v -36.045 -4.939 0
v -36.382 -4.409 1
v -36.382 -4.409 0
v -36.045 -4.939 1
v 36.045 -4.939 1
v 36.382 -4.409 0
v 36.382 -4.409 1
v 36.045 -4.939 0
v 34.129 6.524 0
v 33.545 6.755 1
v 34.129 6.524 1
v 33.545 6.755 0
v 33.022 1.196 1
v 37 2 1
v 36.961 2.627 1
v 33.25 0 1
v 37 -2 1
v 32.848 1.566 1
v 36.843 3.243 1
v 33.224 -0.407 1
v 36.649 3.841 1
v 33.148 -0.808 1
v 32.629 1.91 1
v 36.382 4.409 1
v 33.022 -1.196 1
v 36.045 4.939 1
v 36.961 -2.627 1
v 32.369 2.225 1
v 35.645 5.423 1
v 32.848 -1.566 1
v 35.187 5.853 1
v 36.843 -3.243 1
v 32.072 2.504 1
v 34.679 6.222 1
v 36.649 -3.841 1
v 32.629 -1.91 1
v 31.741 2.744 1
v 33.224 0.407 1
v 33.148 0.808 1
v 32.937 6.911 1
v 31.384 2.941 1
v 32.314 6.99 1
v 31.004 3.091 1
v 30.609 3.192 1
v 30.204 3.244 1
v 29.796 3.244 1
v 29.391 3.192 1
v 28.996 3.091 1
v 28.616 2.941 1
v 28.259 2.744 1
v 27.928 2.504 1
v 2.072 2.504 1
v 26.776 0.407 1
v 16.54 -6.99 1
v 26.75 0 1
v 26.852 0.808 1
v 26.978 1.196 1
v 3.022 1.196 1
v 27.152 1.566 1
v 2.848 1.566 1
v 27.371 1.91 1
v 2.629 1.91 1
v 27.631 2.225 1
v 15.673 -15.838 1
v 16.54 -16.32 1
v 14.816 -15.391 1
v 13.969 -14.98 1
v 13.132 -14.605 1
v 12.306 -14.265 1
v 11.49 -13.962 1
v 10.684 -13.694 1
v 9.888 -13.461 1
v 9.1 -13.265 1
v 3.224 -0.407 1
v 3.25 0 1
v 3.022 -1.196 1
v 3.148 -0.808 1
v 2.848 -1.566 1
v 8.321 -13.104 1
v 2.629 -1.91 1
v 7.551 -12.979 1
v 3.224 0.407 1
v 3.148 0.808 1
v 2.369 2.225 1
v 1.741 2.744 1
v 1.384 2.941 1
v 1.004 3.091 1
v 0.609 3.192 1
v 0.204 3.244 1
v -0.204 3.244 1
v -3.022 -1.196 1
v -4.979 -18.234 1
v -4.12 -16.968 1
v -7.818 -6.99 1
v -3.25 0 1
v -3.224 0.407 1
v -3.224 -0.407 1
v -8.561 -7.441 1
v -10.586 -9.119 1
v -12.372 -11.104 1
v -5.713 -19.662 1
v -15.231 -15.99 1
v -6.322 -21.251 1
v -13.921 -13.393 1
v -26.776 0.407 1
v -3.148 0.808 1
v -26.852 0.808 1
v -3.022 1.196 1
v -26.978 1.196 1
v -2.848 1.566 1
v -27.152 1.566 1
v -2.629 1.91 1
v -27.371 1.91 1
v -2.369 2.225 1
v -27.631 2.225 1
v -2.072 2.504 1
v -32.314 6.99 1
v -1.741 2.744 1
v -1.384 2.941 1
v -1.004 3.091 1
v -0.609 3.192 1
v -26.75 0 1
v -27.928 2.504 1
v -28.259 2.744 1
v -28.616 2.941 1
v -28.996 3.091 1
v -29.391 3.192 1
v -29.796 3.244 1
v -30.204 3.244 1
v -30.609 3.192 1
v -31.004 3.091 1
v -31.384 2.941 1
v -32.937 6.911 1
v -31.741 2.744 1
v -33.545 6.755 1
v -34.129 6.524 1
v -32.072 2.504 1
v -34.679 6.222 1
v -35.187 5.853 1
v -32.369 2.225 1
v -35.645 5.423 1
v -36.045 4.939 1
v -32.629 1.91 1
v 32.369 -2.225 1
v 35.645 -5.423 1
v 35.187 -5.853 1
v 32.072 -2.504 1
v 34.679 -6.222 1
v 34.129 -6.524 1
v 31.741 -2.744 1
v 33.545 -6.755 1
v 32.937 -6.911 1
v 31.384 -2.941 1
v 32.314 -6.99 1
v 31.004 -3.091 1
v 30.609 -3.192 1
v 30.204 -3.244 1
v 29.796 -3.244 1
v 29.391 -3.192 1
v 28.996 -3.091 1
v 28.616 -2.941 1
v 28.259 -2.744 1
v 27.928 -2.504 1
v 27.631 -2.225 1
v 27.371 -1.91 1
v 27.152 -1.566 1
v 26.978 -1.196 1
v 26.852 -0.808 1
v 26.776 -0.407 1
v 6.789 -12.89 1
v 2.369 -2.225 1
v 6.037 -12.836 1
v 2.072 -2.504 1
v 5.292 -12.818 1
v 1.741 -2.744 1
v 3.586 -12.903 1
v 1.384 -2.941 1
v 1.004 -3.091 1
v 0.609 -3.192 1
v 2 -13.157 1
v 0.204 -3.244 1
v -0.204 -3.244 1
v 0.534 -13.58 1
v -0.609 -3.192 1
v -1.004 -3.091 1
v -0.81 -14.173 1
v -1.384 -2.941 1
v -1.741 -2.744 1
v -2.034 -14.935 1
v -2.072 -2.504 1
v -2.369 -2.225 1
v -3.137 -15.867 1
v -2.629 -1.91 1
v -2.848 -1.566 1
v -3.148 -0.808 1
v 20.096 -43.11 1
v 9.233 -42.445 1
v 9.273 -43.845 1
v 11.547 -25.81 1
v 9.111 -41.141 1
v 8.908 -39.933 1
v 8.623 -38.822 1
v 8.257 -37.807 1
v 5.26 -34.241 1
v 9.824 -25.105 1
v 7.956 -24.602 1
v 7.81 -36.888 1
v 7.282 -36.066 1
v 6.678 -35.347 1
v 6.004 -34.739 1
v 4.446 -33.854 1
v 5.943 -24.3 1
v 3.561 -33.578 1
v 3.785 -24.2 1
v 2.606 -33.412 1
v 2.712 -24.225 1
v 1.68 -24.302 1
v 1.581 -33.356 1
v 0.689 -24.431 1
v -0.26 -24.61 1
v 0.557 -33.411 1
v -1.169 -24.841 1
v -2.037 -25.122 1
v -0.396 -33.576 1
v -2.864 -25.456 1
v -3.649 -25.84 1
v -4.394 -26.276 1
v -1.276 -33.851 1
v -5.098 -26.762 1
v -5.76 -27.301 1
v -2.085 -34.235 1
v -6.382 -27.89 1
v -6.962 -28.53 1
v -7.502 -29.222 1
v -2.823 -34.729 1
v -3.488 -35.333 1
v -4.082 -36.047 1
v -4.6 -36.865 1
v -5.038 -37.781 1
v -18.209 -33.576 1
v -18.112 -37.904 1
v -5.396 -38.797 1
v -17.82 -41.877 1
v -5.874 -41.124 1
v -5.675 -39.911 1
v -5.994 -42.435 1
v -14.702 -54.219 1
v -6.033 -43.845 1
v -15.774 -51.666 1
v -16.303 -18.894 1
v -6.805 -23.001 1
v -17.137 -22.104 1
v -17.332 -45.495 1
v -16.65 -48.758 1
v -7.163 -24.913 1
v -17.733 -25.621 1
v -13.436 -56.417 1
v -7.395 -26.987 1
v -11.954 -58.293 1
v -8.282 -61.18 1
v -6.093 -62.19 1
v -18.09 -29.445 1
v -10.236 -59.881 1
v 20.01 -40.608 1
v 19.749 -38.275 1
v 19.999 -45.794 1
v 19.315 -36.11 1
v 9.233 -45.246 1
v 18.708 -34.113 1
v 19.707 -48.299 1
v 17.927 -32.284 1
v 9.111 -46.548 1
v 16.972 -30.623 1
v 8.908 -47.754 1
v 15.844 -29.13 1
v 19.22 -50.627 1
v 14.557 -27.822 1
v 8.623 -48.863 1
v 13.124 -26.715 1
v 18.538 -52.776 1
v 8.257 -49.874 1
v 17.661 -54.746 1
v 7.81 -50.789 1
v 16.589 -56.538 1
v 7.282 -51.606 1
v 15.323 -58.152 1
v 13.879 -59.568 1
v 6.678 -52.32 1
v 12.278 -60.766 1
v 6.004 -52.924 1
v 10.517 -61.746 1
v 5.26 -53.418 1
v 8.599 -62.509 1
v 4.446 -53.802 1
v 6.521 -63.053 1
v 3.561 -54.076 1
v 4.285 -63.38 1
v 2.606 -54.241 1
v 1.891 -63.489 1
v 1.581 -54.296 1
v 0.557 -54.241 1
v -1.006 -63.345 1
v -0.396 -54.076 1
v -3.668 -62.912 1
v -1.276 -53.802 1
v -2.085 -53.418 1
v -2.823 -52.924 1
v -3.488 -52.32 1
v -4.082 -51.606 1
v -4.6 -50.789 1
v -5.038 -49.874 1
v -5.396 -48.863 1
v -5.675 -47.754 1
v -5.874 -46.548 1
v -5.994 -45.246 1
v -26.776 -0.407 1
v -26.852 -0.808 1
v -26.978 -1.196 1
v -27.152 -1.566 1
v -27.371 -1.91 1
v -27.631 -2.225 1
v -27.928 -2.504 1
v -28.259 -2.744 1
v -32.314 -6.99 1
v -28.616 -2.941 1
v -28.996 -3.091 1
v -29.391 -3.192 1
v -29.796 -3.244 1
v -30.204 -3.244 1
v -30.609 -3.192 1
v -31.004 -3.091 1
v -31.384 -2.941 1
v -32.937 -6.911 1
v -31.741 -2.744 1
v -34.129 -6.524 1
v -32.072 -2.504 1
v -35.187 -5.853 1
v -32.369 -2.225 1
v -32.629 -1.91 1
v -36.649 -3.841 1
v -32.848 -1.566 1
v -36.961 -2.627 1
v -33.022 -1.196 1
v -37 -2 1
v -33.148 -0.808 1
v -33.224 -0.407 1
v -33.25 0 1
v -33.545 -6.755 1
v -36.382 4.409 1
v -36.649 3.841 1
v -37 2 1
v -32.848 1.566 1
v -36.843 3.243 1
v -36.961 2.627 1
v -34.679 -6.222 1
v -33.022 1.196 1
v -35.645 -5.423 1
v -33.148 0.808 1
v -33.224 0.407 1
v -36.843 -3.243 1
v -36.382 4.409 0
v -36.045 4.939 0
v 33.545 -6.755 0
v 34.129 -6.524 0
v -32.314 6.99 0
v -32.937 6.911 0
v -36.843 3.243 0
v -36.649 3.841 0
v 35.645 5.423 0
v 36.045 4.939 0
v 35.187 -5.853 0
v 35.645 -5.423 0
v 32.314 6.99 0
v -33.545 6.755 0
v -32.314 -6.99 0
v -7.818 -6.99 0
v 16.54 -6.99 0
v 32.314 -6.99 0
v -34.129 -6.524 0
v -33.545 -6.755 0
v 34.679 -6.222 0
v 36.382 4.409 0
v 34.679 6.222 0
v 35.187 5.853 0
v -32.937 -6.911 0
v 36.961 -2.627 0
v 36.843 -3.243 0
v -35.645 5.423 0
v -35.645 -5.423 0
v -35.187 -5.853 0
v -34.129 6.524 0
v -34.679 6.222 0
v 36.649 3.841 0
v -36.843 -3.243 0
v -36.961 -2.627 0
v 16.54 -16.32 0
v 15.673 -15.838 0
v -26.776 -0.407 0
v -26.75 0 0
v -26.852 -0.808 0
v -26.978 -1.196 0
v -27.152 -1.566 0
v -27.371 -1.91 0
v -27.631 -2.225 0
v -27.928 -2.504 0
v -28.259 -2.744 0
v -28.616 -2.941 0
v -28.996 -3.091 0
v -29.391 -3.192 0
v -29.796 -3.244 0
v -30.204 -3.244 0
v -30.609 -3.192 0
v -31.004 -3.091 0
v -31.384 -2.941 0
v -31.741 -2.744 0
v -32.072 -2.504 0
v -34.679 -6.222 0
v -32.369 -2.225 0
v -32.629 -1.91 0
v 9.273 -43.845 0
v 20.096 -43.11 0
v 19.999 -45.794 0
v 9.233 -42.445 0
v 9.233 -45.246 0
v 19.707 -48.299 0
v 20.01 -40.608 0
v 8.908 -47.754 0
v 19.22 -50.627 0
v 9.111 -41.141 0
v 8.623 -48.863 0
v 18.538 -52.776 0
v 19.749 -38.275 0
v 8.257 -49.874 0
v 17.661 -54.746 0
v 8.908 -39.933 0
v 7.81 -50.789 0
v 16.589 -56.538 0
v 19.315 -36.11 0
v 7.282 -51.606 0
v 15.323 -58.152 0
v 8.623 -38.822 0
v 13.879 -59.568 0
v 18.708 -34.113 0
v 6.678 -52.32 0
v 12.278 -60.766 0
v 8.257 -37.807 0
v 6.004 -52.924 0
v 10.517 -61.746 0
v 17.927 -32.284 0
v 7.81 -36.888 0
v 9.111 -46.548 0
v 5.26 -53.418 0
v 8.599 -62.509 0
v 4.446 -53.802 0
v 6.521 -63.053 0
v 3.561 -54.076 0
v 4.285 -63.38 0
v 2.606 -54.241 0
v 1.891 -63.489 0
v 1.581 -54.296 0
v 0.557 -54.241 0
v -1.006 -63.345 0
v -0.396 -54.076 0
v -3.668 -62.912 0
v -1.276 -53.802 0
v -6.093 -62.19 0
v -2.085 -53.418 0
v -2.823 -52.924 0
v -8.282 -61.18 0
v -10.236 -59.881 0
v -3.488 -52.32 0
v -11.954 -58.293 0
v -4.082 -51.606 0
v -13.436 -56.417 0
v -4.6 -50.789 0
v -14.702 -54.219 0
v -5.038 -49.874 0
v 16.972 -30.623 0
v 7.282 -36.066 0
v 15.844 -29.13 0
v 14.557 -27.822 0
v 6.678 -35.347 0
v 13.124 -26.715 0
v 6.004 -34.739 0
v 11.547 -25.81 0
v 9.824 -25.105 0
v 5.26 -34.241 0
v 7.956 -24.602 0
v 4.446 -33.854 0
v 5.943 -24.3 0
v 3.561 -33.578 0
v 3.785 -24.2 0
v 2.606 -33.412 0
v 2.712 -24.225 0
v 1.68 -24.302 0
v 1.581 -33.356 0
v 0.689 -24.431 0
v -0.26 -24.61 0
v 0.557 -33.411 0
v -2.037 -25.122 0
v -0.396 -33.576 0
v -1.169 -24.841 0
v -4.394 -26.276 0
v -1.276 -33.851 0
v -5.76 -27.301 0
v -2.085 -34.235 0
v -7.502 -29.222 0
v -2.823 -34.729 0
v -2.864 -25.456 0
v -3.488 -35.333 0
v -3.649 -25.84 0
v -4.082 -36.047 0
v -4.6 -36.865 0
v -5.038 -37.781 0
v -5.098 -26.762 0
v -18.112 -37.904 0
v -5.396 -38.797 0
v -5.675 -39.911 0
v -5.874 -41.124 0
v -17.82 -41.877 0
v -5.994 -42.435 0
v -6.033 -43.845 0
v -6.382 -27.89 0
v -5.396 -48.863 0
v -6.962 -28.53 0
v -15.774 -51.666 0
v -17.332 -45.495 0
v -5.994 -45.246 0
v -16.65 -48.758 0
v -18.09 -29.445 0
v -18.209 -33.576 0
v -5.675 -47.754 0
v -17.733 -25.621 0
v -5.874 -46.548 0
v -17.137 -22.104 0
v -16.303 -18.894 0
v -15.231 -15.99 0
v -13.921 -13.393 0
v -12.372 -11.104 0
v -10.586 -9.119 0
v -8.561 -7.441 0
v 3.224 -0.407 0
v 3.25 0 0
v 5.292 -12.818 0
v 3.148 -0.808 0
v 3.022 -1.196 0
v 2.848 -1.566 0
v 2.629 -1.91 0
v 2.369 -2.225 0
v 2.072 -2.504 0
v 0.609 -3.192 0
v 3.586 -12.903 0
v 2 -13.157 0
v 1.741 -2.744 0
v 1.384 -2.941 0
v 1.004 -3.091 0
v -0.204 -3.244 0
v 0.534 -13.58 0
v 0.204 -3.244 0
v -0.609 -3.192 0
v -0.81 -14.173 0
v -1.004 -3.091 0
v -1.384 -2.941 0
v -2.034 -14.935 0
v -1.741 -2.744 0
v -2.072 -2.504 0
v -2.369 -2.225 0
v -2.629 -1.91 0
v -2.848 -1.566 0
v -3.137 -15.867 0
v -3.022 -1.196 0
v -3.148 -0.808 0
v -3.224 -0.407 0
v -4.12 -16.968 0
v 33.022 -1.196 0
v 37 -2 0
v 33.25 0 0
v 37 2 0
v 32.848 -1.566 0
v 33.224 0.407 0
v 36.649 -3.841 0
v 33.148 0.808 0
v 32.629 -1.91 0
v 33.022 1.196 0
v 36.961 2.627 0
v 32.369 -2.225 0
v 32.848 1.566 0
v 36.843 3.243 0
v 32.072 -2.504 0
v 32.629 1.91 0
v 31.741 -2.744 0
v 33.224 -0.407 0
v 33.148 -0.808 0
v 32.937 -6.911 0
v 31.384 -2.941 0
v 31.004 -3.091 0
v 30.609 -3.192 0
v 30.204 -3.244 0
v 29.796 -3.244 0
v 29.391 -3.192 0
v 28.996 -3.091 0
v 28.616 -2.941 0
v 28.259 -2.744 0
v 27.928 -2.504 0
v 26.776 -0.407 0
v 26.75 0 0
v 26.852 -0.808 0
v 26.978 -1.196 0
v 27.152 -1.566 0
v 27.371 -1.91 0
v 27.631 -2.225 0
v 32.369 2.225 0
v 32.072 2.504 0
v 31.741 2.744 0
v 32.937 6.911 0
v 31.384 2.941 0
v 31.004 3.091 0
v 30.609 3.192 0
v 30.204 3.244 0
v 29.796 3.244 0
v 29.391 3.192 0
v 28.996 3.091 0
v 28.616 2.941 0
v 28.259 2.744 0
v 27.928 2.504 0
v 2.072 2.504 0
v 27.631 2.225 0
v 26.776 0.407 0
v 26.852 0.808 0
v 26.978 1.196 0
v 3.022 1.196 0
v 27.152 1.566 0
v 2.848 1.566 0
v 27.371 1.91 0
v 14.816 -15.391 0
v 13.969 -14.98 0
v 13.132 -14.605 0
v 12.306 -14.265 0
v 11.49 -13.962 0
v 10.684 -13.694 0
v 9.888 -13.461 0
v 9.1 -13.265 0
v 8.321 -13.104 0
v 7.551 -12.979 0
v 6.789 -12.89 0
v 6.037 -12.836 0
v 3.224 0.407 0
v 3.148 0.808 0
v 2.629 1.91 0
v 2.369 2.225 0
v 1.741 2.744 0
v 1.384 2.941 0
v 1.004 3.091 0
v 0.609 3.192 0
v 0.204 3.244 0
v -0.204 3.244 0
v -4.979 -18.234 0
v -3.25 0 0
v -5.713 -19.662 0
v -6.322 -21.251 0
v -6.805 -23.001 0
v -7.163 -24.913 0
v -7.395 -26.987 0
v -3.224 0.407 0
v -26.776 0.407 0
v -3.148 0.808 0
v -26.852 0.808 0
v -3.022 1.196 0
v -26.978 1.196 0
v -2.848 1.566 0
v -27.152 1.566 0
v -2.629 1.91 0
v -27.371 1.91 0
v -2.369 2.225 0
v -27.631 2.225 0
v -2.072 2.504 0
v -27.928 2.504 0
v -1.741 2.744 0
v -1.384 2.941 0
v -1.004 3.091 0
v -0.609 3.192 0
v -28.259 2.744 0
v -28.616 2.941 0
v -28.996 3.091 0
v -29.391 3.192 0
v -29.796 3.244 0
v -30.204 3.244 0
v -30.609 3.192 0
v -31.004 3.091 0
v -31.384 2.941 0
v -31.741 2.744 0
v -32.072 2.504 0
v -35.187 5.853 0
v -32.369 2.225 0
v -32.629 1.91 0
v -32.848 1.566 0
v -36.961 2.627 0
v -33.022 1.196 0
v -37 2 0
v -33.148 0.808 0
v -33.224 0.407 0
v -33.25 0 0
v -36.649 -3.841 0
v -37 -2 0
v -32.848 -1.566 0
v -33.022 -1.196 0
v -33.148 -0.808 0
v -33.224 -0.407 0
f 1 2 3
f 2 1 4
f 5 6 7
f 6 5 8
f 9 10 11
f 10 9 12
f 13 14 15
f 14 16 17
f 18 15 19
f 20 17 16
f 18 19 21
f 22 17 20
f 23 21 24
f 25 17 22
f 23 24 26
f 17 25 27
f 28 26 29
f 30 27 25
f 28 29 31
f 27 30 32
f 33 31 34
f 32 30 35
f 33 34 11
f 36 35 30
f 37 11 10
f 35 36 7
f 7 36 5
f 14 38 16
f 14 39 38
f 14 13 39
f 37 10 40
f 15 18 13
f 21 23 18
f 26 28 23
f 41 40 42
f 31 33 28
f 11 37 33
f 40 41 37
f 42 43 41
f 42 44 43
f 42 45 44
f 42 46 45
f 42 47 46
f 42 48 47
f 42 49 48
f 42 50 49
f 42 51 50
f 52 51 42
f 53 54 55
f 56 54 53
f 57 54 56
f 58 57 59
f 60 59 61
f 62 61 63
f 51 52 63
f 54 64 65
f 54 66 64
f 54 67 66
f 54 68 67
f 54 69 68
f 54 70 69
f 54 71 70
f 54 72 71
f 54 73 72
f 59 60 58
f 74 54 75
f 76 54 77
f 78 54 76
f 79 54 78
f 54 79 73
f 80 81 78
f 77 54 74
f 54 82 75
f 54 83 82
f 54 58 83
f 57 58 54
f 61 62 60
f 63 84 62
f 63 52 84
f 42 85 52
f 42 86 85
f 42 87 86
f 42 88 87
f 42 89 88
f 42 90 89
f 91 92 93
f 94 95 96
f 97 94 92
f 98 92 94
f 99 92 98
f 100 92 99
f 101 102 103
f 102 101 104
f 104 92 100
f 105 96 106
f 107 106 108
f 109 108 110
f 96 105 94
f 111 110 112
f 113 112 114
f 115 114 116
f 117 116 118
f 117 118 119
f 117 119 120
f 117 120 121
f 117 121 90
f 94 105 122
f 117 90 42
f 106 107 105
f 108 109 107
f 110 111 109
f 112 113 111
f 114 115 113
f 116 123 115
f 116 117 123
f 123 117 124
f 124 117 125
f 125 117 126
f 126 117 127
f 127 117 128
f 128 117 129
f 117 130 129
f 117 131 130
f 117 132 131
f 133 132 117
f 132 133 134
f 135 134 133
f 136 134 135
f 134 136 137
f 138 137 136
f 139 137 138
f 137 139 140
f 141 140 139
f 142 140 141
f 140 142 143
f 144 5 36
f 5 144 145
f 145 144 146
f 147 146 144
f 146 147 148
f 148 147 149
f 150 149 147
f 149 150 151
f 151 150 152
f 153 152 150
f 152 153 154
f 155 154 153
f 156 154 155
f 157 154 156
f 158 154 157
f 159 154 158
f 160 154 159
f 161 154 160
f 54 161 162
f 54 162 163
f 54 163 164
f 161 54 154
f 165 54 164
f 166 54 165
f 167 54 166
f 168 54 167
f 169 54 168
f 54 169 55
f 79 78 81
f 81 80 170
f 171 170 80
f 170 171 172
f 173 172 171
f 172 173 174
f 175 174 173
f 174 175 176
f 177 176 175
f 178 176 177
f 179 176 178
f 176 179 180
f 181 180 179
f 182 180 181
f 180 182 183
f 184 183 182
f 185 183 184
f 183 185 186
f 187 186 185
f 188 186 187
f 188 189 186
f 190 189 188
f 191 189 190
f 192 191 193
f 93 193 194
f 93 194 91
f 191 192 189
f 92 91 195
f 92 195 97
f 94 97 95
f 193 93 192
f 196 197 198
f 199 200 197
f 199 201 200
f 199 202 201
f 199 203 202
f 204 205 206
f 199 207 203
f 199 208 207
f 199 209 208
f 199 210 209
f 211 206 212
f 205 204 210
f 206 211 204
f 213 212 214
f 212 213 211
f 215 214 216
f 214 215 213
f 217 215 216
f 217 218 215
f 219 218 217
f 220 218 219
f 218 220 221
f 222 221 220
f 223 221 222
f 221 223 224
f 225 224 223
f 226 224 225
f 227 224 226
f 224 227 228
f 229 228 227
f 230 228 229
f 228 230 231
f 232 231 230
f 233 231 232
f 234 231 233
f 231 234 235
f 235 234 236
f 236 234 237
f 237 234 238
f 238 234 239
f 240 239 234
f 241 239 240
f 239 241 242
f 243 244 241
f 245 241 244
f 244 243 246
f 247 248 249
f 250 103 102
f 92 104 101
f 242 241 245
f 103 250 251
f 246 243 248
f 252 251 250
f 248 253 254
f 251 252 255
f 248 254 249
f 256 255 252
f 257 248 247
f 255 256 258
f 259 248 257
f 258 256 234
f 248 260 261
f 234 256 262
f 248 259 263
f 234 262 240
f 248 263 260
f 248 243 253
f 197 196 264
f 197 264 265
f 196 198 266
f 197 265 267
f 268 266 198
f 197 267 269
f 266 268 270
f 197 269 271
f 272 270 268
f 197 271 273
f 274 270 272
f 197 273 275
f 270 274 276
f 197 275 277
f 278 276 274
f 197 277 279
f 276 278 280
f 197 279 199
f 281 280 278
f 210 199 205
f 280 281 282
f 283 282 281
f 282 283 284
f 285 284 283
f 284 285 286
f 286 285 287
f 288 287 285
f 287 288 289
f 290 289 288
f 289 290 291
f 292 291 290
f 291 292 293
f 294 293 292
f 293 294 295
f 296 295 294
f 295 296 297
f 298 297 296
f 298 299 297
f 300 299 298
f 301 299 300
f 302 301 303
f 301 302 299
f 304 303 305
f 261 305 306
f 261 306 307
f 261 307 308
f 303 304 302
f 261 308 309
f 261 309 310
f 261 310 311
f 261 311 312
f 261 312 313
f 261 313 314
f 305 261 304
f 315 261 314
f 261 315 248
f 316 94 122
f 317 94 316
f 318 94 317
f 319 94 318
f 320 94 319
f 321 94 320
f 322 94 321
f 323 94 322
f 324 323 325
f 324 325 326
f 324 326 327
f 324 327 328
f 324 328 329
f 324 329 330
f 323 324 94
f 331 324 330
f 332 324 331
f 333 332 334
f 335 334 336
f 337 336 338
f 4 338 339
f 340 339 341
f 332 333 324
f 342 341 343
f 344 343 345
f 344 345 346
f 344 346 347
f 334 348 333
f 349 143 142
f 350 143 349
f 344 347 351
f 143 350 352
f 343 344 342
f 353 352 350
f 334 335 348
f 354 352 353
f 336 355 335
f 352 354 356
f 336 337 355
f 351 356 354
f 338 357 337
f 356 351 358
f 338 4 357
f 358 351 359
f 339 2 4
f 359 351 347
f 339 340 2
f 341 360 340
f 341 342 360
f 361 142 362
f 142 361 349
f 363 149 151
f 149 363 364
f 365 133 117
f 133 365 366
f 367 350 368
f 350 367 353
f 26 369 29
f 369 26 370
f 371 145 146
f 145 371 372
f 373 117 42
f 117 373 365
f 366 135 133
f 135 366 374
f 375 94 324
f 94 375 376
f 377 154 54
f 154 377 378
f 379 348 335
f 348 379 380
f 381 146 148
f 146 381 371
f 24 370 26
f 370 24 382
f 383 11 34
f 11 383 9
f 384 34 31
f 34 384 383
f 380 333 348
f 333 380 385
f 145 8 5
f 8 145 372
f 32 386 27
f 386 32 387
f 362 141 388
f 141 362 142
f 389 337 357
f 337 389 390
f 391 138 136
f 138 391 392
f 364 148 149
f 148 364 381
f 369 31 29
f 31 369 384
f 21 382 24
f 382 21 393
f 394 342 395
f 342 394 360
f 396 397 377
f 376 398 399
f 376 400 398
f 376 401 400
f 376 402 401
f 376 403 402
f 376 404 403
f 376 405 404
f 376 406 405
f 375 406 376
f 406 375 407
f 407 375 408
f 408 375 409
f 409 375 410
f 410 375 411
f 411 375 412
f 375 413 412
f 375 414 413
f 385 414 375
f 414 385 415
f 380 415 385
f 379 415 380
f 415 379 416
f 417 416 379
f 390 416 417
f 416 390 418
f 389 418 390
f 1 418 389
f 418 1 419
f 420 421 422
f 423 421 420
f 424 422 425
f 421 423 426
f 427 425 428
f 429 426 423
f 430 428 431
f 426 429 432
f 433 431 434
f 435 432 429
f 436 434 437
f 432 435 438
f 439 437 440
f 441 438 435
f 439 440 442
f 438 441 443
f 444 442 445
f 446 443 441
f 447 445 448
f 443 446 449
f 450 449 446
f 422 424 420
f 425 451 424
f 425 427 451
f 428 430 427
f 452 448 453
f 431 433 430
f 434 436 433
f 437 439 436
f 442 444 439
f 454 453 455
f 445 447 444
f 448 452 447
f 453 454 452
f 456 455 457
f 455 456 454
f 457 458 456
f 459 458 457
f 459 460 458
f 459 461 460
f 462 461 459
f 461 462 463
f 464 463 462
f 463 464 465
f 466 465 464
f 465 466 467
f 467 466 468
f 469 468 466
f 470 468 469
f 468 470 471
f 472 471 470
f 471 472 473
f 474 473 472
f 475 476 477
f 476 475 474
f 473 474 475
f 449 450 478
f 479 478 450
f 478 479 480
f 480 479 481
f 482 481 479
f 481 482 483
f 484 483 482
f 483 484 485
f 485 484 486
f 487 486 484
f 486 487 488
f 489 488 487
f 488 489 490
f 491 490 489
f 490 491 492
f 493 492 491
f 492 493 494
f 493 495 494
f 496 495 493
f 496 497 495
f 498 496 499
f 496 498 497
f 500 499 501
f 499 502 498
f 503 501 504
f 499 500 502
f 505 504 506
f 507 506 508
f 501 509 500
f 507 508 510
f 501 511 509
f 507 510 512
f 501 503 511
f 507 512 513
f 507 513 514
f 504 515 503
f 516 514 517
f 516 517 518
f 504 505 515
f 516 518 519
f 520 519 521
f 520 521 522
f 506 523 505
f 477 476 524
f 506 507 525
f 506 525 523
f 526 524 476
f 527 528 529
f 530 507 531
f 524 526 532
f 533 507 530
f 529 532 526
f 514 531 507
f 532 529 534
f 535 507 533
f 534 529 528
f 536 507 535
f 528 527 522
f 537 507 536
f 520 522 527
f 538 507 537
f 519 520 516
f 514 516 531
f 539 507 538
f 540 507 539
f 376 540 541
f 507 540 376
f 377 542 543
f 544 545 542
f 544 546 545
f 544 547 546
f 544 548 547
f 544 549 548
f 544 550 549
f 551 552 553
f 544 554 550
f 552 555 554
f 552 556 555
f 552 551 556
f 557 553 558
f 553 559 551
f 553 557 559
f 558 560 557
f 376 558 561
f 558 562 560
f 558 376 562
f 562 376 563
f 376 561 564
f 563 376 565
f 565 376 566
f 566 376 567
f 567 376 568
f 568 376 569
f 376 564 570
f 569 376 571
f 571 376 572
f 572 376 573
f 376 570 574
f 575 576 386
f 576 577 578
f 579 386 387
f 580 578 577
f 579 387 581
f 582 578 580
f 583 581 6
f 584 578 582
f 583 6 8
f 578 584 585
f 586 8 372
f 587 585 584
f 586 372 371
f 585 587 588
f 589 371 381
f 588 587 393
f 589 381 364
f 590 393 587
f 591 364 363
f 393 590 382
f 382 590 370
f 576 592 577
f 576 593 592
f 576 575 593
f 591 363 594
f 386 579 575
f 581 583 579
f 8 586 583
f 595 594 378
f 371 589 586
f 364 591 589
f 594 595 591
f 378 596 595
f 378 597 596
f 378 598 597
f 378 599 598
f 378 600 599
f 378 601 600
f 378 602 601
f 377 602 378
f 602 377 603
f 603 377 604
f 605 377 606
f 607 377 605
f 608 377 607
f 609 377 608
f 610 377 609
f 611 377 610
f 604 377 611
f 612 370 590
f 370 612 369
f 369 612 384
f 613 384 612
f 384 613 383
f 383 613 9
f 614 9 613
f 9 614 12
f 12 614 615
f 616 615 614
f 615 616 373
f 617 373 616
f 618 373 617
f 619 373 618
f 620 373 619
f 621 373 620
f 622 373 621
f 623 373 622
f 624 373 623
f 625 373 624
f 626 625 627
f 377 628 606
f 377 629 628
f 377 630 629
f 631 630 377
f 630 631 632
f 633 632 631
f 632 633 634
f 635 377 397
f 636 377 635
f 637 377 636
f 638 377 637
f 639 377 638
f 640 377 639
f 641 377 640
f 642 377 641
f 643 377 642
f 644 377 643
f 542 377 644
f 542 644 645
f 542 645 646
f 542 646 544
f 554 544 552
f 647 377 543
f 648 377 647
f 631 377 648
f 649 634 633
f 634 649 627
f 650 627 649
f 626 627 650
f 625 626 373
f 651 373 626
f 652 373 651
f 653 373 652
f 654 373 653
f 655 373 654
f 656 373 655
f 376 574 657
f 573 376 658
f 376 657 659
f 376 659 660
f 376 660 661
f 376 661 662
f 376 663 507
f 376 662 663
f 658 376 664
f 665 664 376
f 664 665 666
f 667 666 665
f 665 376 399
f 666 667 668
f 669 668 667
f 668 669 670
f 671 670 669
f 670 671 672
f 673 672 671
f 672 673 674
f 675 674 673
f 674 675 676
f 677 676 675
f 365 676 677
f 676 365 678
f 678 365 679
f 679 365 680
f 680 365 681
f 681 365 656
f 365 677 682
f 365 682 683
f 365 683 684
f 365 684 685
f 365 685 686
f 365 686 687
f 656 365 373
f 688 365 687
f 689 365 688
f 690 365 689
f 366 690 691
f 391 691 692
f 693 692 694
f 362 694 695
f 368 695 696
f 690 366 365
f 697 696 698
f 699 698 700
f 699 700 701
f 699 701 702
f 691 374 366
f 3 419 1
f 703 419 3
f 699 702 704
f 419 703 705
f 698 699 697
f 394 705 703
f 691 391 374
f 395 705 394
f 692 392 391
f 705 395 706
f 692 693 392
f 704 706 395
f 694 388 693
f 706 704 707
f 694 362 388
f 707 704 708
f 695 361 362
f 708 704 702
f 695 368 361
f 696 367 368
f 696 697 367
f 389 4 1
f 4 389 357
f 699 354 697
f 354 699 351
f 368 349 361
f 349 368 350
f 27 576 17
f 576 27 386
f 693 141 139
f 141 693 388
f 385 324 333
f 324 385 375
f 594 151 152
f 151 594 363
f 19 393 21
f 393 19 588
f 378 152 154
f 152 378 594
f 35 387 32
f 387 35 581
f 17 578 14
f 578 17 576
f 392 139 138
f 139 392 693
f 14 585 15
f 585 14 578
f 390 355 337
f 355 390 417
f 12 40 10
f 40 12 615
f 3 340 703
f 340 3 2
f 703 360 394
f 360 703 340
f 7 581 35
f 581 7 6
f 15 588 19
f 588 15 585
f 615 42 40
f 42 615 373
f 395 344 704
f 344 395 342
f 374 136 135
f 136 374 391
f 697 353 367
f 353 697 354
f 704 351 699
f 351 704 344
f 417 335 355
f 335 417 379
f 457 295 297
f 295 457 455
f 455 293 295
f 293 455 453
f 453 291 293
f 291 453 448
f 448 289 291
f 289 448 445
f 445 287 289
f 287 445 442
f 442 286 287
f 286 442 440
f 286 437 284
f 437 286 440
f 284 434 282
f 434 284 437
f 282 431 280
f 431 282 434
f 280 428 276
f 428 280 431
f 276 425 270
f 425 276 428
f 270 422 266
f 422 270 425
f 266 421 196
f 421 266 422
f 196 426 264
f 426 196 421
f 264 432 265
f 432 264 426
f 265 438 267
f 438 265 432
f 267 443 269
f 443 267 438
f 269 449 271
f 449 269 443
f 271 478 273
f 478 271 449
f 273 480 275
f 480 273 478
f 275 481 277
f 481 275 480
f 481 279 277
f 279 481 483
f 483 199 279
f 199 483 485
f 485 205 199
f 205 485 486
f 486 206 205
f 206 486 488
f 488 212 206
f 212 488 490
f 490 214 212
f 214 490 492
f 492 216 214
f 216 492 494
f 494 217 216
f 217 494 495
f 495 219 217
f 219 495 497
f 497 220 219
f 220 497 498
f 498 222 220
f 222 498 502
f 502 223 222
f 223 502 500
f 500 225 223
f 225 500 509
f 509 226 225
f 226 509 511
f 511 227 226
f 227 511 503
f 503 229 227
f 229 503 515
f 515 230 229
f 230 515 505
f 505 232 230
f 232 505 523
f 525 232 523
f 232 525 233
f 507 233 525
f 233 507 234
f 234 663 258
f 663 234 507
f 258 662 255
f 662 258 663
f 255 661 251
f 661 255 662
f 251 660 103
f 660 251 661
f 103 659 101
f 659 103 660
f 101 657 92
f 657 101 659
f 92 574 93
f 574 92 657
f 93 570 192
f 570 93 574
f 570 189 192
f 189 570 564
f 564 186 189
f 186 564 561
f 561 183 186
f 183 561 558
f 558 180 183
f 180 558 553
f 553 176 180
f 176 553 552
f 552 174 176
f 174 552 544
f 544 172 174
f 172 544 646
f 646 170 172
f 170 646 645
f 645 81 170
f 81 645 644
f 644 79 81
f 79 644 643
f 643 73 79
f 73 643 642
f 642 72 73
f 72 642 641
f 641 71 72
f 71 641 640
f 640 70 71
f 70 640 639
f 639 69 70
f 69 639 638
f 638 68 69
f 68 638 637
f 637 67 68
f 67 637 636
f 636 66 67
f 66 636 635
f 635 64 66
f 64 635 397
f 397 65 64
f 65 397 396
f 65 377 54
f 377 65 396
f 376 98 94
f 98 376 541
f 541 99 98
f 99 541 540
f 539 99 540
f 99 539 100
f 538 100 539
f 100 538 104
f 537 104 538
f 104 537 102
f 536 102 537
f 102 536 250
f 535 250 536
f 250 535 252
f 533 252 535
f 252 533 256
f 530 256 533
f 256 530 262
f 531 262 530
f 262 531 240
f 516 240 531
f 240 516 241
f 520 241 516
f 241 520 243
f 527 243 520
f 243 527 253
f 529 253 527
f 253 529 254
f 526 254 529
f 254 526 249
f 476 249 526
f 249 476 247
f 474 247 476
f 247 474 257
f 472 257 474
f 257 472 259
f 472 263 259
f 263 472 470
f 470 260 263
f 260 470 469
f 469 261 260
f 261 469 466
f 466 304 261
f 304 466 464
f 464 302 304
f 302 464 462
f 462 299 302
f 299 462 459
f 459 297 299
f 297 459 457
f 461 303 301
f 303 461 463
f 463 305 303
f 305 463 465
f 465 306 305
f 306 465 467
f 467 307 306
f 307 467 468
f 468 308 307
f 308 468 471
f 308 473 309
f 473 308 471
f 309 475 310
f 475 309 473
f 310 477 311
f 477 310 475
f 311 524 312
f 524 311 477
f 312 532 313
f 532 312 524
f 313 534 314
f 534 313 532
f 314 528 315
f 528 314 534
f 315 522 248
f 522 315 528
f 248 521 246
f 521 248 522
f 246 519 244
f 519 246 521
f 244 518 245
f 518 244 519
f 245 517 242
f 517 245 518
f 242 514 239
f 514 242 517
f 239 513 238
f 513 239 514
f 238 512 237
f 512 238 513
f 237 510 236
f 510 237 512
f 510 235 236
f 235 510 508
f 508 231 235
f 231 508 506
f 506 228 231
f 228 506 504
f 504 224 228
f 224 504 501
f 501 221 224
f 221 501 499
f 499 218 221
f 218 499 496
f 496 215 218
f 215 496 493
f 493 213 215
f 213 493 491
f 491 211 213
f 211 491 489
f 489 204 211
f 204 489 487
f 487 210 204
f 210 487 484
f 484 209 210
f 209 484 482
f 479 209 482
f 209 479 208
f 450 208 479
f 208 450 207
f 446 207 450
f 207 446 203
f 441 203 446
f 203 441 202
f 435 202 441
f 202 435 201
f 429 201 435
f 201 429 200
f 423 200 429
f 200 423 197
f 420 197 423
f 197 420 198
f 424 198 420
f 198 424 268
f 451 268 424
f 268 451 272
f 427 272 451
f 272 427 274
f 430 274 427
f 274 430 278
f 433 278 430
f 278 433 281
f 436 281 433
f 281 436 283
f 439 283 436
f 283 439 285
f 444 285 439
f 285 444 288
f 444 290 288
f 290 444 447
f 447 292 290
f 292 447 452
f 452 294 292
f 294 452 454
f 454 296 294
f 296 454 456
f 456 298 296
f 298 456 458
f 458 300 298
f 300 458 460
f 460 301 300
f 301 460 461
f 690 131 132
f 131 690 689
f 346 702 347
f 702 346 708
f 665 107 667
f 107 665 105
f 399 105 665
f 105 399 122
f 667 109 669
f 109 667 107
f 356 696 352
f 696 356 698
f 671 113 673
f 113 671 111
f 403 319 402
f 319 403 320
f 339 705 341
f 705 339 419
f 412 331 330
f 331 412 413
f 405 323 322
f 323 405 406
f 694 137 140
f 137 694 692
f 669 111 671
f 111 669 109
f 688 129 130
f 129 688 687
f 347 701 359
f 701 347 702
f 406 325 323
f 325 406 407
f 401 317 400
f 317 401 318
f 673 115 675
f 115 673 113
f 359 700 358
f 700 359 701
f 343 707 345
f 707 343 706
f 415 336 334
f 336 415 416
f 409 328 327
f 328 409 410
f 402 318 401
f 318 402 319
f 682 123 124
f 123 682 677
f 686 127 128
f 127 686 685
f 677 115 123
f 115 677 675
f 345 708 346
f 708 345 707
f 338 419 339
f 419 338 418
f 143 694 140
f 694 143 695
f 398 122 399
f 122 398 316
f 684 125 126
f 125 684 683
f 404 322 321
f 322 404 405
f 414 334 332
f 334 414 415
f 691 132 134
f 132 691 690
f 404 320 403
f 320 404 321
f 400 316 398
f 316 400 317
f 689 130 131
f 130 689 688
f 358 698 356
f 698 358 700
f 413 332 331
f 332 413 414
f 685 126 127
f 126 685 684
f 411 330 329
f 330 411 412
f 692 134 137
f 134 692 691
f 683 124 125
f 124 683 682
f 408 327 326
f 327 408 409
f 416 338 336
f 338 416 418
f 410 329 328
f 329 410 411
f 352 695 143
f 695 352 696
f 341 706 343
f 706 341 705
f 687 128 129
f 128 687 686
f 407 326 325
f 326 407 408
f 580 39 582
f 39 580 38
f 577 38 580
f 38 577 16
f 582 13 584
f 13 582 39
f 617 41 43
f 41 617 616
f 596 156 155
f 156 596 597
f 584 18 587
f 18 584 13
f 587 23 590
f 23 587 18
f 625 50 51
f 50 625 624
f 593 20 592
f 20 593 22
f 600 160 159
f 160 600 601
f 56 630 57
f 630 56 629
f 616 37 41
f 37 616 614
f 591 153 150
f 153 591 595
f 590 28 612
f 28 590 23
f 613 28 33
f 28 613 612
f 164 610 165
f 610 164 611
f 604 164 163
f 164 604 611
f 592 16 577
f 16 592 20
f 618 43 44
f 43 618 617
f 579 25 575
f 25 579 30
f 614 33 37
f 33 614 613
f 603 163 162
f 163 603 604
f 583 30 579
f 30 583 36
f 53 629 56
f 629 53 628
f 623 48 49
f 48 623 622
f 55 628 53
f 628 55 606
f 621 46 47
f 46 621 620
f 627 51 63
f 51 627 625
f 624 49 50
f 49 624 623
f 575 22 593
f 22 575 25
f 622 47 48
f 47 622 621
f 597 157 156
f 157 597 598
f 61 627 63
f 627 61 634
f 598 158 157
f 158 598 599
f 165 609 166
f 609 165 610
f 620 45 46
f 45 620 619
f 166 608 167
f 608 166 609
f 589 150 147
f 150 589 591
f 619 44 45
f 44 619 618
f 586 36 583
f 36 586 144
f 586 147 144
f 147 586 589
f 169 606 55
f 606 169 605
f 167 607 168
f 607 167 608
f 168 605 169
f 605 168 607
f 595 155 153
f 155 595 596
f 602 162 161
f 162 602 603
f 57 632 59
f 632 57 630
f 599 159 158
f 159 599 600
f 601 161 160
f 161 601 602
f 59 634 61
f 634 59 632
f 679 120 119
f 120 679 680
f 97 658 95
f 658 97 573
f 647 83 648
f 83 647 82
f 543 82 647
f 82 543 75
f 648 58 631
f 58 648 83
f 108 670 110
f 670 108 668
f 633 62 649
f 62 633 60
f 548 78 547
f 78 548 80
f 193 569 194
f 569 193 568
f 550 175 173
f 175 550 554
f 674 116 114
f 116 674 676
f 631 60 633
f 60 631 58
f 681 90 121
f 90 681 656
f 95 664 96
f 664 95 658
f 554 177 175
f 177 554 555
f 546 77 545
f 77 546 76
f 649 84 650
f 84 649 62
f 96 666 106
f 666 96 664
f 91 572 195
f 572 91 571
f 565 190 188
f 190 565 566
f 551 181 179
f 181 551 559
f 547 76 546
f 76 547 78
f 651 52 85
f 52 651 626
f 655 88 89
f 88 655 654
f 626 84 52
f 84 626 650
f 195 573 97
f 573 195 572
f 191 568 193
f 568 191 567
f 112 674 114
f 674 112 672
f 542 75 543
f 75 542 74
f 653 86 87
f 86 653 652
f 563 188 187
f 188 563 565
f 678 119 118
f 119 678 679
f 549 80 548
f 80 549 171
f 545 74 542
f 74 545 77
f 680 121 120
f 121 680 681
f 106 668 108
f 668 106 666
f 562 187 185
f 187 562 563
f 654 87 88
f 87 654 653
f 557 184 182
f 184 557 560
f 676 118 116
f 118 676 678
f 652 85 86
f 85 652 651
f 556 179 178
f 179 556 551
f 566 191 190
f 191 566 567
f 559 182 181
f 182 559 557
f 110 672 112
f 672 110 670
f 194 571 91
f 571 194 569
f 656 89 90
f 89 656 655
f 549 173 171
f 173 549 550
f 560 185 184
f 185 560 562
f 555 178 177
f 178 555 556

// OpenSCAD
$fn = 50;


difference() {
	union() {
		translate(v = [0, 0, 0]) {
			rotate(a = [0, 0, 0]) {
				hull() {
					translate(v = [-32.0000000000, 2.0000000000, 0]) {
						rotate(a = [0, 0, 0]) {
							translate(v = [0, 0, 0]) {
								rotate(a = [0, 0, 0]) {
									cylinder(h = 1, r = 5);
								}
							}
						}
					}
					translate(v = [32.0000000000, 2.0000000000, 0]) {
						rotate(a = [0, 0, 0]) {
							translate(v = [0, 0, 0]) {
								rotate(a = [0, 0, 0]) {
									cylinder(h = 1, r = 5);
								}
							}
						}
					}
					translate(v = [-32.0000000000, -2.0000000000, 0]) {
						rotate(a = [0, 0, 0]) {
							translate(v = [0, 0, 0]) {
								rotate(a = [0, 0, 0]) {
									cylinder(h = 1, r = 5);
								}
							}
						}
					}
					translate(v = [32.0000000000, -2.0000000000, 0]) {
						rotate(a = [0, 0, 0]) {
							translate(v = [0, 0, 0]) {
								rotate(a = [0, 0, 0]) {
									cylinder(h = 1, r = 5);
								}
							}
						}
					}
				}
			}
		}
		translate(v = [0, -5, 0]) {
			rotate(a = [0, 0, 0]) {
				linear_extrude(height = 1) {
					text(font = "DejaVu Sans Mono:style=Bold", halign = "center", size = 57.0000000000, text = "6", valign = "top");
				}
			}
		}
	}
	union() {
		translate(v = [-30.0000000000, 0.0000000000, -125.0000000000]) {
			rotate(a = [0, 0, 0]) {
				cylinder(h = 250, r = 3.2500000000);
			}
		}
		translate(v = [30.0000000000, 0.0000000000, -125.0000000000]) {
			rotate(a = [0, 0, 0]) {
				cylinder(h = 250, r = 3.2500000000);
			}
		}
		translate(v = [30.0000000000, 0.0000000000, -125.0000000000]) {
			rotate(a = [0, 0, 0]) {
				cylinder(h = 250, r = 3.2500000000);
			}
		}
		translate(v = [0, 0, -125.0000000000]) {
			rotate(a = [0, 0, 0]) {
				cylinder(h = 250, r = 3.2500000000);
			}
		}
	}
}
